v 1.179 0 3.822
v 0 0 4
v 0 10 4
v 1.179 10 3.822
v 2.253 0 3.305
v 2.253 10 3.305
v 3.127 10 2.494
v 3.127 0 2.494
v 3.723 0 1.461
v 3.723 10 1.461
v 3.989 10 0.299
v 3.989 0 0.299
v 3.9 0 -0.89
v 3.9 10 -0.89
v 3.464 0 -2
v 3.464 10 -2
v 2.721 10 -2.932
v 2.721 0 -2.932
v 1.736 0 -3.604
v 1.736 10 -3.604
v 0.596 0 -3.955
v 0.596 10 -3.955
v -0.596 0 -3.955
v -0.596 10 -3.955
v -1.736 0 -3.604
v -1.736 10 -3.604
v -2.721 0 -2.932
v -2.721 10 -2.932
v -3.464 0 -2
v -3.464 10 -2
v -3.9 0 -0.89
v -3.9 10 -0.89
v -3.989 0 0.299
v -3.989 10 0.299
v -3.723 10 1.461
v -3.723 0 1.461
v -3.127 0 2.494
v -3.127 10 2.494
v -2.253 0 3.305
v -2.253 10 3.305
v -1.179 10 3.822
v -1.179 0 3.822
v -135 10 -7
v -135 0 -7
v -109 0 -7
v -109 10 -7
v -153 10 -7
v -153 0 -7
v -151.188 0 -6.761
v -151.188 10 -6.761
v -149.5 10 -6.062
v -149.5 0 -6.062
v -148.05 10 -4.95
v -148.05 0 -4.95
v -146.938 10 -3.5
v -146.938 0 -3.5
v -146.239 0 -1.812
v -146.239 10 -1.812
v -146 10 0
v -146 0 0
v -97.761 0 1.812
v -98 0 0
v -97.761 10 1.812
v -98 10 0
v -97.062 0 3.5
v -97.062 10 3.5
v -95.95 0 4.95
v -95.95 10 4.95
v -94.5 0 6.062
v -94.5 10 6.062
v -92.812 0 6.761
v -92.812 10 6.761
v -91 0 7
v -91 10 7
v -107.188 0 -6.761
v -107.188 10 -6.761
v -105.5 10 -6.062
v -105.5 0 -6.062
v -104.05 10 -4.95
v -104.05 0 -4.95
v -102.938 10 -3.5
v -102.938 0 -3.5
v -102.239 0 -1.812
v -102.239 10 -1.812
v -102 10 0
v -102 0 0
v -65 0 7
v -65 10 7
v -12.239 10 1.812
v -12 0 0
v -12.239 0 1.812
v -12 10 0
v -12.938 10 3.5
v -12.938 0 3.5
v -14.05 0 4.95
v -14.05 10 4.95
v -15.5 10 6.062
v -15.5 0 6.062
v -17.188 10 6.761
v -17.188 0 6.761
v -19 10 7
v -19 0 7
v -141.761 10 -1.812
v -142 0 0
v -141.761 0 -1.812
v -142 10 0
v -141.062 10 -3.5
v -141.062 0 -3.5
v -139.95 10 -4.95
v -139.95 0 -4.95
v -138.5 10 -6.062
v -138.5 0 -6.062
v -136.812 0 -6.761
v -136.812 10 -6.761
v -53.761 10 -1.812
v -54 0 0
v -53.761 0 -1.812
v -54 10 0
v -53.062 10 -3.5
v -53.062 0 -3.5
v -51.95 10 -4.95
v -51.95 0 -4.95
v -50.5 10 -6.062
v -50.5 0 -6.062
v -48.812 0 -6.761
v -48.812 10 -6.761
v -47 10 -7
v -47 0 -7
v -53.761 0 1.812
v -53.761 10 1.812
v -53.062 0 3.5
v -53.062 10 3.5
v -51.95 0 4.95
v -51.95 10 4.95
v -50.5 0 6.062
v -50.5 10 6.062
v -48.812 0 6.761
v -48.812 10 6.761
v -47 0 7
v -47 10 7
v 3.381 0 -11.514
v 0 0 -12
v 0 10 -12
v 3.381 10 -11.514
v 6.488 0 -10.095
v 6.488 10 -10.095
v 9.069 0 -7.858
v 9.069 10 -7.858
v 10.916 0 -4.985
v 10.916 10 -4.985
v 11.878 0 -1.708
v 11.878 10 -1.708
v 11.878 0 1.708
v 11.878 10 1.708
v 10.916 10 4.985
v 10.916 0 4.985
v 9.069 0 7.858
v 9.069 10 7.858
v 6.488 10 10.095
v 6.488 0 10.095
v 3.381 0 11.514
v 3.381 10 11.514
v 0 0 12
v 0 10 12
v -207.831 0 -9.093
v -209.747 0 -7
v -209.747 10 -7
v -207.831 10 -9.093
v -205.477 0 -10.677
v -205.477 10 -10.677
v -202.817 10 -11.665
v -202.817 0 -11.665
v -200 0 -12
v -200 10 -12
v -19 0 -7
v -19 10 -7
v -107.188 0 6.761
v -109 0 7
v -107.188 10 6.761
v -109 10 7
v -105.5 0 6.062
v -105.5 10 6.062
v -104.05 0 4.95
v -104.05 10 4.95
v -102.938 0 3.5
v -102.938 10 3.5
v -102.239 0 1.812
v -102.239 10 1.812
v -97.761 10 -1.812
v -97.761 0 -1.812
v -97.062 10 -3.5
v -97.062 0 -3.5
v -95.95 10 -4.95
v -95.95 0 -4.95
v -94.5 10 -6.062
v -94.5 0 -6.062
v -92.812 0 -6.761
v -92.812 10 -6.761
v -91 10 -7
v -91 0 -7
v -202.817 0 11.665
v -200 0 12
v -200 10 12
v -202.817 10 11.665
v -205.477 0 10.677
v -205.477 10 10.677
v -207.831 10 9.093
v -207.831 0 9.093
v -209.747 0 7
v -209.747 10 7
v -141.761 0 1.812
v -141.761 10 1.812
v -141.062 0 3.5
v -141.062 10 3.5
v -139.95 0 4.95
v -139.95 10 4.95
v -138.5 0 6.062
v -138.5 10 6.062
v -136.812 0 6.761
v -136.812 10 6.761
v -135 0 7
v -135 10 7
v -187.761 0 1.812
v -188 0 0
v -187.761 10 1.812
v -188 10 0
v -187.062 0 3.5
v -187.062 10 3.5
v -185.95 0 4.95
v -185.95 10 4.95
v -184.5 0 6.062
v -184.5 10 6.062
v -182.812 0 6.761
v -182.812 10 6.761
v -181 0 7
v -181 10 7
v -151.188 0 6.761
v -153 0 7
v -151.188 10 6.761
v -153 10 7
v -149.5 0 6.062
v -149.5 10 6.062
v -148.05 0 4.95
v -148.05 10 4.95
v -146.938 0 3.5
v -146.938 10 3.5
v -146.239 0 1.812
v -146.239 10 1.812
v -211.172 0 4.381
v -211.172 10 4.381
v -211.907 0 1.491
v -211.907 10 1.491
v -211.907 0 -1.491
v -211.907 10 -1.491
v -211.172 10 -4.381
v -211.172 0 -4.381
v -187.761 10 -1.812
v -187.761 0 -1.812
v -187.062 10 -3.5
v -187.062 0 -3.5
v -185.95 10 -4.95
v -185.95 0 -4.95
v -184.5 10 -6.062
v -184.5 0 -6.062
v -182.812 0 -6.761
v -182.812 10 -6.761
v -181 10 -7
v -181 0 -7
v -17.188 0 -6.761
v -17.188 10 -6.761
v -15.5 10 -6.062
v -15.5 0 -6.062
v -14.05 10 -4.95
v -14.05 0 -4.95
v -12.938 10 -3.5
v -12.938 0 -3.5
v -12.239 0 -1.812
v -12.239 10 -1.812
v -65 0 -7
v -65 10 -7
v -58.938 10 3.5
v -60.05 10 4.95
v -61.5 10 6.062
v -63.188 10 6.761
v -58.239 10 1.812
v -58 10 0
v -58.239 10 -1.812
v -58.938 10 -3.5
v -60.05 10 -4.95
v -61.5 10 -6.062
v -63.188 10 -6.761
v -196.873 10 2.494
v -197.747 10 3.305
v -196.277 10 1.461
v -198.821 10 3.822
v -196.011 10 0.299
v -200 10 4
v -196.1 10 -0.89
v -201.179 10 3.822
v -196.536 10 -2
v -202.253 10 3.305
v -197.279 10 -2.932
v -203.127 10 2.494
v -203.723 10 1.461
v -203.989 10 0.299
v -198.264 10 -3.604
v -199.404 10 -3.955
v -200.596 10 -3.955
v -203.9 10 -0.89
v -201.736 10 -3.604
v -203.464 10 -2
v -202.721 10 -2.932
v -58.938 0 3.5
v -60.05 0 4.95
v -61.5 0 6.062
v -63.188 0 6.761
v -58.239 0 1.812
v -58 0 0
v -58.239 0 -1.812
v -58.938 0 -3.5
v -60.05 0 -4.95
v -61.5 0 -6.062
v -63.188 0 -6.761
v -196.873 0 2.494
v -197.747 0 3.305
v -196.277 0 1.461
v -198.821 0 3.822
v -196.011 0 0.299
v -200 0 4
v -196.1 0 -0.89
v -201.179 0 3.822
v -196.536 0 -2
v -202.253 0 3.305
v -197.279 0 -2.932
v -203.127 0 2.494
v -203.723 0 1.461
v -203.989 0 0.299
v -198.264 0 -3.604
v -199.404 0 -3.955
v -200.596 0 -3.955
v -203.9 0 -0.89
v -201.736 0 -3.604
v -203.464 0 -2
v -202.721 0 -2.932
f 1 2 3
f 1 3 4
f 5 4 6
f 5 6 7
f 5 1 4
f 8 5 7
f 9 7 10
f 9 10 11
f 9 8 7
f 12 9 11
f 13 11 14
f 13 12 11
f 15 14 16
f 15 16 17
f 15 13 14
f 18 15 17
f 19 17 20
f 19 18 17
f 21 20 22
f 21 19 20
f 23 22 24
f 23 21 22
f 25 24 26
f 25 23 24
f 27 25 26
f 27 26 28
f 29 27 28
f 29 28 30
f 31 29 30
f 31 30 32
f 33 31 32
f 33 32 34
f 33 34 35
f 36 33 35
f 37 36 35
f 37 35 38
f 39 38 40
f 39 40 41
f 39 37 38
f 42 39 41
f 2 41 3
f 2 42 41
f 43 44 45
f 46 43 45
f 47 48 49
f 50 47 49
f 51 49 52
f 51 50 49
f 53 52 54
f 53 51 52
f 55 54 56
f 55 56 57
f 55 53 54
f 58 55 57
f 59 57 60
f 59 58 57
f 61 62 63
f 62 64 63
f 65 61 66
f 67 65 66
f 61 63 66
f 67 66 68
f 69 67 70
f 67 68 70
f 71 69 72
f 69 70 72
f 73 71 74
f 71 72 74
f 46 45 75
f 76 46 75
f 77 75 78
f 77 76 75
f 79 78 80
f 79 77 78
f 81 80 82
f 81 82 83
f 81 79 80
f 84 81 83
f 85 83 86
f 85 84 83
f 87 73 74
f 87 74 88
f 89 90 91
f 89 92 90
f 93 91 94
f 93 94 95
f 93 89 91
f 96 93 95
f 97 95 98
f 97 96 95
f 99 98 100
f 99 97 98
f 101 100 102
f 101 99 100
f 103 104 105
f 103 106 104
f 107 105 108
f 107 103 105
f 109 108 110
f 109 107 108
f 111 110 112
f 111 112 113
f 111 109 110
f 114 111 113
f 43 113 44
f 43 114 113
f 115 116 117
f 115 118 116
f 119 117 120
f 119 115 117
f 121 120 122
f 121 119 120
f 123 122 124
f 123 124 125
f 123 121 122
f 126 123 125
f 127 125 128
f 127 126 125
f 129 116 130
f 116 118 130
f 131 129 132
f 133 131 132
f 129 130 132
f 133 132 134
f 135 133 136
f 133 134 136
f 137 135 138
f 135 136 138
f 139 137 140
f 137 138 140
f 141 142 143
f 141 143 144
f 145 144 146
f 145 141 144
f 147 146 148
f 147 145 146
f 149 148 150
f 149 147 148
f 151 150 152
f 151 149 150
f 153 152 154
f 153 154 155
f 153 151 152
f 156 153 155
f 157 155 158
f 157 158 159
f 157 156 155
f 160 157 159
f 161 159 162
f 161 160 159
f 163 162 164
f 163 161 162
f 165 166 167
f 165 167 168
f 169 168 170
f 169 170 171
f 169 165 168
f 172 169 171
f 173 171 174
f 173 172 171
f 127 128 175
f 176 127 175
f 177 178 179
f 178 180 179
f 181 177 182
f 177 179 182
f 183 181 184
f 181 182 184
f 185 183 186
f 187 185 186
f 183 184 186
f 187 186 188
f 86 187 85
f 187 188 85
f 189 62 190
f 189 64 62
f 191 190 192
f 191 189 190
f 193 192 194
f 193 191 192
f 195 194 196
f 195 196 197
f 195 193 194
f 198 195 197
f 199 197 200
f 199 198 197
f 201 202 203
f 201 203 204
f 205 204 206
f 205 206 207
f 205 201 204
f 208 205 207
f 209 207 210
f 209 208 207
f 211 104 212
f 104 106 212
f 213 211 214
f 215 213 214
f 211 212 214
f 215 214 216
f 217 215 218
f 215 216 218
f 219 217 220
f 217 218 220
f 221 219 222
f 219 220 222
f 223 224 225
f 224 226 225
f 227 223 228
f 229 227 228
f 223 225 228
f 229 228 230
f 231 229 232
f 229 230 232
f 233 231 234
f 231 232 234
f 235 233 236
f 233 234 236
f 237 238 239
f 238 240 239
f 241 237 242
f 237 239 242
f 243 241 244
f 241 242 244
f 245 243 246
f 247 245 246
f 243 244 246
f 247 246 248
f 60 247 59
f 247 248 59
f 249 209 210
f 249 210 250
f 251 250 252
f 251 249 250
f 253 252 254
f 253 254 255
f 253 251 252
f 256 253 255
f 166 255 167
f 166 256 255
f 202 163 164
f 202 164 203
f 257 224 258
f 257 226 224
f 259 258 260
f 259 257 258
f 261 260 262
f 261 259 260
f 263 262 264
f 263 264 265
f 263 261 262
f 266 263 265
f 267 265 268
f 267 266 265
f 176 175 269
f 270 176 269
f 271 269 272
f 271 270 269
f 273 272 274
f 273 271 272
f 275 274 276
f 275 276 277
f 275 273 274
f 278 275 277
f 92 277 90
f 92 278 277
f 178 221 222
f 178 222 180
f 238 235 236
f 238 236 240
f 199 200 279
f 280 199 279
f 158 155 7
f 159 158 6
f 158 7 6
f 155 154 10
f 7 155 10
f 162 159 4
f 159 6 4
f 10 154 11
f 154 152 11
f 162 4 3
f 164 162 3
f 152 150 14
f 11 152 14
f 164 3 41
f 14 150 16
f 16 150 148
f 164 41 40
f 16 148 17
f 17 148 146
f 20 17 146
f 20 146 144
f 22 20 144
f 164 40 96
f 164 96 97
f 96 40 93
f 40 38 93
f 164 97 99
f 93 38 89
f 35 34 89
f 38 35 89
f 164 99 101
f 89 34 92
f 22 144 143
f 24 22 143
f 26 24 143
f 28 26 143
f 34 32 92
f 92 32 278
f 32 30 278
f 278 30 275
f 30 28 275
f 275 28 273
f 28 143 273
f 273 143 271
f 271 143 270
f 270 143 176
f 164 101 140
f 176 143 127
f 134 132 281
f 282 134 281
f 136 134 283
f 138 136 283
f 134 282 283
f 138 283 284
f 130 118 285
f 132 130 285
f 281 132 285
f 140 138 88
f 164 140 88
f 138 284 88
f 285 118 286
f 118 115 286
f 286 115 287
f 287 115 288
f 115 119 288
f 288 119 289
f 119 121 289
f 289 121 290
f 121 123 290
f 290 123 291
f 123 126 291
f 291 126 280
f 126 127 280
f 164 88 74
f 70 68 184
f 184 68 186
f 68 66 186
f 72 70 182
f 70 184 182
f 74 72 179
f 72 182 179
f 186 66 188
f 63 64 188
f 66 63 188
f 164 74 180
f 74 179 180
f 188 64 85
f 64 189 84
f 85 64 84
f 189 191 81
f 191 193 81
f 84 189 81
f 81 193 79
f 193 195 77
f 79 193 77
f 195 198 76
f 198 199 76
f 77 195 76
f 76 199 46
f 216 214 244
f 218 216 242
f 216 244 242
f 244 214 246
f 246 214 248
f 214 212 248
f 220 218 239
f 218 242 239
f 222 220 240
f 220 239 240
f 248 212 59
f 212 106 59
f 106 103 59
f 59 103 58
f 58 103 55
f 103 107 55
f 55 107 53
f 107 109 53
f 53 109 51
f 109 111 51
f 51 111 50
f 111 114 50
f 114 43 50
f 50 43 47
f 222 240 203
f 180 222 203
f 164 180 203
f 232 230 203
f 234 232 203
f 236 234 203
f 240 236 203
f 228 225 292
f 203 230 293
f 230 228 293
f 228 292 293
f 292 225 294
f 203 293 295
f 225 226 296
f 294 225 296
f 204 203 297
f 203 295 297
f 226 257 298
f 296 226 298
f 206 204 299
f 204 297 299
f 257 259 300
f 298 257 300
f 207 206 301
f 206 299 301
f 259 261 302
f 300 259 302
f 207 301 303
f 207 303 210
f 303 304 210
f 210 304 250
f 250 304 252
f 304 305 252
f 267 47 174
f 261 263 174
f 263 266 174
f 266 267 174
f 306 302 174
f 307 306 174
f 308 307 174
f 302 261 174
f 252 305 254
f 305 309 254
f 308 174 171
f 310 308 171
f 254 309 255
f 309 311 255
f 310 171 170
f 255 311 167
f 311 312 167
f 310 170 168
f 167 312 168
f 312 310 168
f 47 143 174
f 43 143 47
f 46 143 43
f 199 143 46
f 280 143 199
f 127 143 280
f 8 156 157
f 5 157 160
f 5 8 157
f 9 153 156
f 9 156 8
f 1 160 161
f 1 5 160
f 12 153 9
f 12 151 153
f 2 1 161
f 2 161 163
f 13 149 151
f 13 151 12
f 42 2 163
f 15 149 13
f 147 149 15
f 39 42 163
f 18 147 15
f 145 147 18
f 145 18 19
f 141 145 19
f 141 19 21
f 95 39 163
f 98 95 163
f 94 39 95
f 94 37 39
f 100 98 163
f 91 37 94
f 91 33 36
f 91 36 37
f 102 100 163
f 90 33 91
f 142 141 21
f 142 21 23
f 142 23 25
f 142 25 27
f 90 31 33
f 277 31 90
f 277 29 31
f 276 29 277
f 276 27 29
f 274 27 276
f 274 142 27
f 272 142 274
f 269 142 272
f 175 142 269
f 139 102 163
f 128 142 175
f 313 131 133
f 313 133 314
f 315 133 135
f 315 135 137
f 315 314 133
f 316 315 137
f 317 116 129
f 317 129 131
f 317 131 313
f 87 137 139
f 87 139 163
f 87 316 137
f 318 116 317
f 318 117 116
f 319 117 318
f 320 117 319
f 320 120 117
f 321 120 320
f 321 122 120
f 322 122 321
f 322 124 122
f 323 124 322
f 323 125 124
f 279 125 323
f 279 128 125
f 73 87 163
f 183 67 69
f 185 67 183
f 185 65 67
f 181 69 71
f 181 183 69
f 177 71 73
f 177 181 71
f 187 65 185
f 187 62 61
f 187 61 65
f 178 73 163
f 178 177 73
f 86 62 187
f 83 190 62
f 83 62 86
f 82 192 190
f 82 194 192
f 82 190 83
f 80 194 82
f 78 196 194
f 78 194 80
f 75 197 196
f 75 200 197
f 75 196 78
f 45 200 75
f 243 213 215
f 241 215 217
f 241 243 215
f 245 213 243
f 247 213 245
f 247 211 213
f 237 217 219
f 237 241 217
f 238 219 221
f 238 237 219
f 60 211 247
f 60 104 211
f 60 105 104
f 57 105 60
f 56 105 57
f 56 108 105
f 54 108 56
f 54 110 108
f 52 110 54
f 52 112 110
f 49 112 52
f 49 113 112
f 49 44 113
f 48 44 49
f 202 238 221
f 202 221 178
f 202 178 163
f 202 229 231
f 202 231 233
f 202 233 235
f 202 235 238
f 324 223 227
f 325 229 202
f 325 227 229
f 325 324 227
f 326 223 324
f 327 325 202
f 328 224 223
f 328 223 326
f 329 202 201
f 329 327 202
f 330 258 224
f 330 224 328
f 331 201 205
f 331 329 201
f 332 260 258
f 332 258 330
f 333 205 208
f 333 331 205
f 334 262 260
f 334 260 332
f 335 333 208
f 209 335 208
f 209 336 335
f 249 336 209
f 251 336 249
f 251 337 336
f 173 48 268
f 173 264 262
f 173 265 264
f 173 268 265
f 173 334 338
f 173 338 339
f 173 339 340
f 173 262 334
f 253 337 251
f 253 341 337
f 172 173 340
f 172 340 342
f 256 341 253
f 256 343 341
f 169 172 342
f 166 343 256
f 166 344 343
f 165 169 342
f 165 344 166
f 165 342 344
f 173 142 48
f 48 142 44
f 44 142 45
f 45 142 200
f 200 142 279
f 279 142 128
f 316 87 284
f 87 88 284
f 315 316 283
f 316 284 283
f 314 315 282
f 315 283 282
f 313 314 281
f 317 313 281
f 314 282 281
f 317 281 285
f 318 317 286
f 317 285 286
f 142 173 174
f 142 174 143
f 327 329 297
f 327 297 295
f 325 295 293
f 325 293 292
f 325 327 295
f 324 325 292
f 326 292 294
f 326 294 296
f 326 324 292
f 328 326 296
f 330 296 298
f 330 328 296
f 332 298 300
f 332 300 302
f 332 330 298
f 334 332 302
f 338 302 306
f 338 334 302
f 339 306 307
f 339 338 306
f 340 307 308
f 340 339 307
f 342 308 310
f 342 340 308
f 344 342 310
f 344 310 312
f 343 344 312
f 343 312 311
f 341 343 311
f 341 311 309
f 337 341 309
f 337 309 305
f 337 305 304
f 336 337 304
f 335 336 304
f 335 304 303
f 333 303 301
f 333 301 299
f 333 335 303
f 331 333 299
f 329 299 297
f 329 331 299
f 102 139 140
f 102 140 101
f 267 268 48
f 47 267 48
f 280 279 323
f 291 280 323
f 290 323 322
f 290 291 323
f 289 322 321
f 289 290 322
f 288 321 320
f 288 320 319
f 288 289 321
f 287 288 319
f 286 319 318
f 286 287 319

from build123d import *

# Parameters (mm, degrees)
SKETCH1_R           = 4
SKETCH1_W           = 42
SKETCH1_H           = 14
SKETCH1_W_2         = 40
BOSS_EXTRUDE1_DEPTH = 10
FILLET1_R           = 7


with BuildPart() as part:
    # Sketch1 → Boss-Extrude1 (new body)
    with BuildSketch(Plane(origin=(0, 0, 0), x_dir=(1, 0, 0), z_dir=(0, 1, 0))):
        with BuildLine():
            Line((-200, 12), (0, 12))
            ThreePointArc((0, 12), (12, 0), (0, -12))
            Line((0, -12), (-200, -12))
            ThreePointArc((-200, -12), (-205.477225575, -10.677078252), (-209.746794345, -7))
            ThreePointArc((-209.746794345, -7), (-212, 0), (-209.746794345, 7))
            ThreePointArc((-209.746794345, 7), (-205.477225575, 10.677078252), (-200, 12))
        make_face()
        with Locations(Location((-200, 0, 0), (0, 0, 270))):
            Circle(SKETCH1_R, mode=Mode.SUBTRACT)
        with Locations(Location((0, 0, 0), (0, 0, 270))):
            Circle(SKETCH1_R, mode=Mode.SUBTRACT)
        with Locations((-167, 0)):
            Rectangle(SKETCH1_W, SKETCH1_H, mode=Mode.SUBTRACT)
        with Locations((-122, 0)):
            Rectangle(SKETCH1_W_2, SKETCH1_H, mode=Mode.SUBTRACT)
        with Locations((-78, 0)):
            Rectangle(SKETCH1_W_2, SKETCH1_H, mode=Mode.SUBTRACT)
        with Locations((-33, 0)):
            Rectangle(SKETCH1_W, SKETCH1_H, mode=Mode.SUBTRACT)
    extrude(amount=BOSS_EXTRUDE1_DEPTH)

    # Fillet1
    fillet1_edges = [part.edges().sort_by_distance(p)[0] for p in [
        (-142, 5, -7),
        (-98, 5, -7),
        (-54, 5, -7),
        (-58, 5, -7),
        (-12, 5, -7),
        (-102, 5, -7),
        (-146, 5, -7),
        (-146, 5, 7),
        (-102, 5, 7),
        (-58, 5, 7),
        (-12, 5, 7),
        (-54, 5, 7),
        (-98, 5, 7),
        (-142, 5, 7),
        (-188, 5, 7),
        (-188, 5, -7),
    ]]
    fillet(fillet1_edges, radius=FILLET1_R - 0.0001)  # a hair under: the kernel refuses the full size


solid = part.part
